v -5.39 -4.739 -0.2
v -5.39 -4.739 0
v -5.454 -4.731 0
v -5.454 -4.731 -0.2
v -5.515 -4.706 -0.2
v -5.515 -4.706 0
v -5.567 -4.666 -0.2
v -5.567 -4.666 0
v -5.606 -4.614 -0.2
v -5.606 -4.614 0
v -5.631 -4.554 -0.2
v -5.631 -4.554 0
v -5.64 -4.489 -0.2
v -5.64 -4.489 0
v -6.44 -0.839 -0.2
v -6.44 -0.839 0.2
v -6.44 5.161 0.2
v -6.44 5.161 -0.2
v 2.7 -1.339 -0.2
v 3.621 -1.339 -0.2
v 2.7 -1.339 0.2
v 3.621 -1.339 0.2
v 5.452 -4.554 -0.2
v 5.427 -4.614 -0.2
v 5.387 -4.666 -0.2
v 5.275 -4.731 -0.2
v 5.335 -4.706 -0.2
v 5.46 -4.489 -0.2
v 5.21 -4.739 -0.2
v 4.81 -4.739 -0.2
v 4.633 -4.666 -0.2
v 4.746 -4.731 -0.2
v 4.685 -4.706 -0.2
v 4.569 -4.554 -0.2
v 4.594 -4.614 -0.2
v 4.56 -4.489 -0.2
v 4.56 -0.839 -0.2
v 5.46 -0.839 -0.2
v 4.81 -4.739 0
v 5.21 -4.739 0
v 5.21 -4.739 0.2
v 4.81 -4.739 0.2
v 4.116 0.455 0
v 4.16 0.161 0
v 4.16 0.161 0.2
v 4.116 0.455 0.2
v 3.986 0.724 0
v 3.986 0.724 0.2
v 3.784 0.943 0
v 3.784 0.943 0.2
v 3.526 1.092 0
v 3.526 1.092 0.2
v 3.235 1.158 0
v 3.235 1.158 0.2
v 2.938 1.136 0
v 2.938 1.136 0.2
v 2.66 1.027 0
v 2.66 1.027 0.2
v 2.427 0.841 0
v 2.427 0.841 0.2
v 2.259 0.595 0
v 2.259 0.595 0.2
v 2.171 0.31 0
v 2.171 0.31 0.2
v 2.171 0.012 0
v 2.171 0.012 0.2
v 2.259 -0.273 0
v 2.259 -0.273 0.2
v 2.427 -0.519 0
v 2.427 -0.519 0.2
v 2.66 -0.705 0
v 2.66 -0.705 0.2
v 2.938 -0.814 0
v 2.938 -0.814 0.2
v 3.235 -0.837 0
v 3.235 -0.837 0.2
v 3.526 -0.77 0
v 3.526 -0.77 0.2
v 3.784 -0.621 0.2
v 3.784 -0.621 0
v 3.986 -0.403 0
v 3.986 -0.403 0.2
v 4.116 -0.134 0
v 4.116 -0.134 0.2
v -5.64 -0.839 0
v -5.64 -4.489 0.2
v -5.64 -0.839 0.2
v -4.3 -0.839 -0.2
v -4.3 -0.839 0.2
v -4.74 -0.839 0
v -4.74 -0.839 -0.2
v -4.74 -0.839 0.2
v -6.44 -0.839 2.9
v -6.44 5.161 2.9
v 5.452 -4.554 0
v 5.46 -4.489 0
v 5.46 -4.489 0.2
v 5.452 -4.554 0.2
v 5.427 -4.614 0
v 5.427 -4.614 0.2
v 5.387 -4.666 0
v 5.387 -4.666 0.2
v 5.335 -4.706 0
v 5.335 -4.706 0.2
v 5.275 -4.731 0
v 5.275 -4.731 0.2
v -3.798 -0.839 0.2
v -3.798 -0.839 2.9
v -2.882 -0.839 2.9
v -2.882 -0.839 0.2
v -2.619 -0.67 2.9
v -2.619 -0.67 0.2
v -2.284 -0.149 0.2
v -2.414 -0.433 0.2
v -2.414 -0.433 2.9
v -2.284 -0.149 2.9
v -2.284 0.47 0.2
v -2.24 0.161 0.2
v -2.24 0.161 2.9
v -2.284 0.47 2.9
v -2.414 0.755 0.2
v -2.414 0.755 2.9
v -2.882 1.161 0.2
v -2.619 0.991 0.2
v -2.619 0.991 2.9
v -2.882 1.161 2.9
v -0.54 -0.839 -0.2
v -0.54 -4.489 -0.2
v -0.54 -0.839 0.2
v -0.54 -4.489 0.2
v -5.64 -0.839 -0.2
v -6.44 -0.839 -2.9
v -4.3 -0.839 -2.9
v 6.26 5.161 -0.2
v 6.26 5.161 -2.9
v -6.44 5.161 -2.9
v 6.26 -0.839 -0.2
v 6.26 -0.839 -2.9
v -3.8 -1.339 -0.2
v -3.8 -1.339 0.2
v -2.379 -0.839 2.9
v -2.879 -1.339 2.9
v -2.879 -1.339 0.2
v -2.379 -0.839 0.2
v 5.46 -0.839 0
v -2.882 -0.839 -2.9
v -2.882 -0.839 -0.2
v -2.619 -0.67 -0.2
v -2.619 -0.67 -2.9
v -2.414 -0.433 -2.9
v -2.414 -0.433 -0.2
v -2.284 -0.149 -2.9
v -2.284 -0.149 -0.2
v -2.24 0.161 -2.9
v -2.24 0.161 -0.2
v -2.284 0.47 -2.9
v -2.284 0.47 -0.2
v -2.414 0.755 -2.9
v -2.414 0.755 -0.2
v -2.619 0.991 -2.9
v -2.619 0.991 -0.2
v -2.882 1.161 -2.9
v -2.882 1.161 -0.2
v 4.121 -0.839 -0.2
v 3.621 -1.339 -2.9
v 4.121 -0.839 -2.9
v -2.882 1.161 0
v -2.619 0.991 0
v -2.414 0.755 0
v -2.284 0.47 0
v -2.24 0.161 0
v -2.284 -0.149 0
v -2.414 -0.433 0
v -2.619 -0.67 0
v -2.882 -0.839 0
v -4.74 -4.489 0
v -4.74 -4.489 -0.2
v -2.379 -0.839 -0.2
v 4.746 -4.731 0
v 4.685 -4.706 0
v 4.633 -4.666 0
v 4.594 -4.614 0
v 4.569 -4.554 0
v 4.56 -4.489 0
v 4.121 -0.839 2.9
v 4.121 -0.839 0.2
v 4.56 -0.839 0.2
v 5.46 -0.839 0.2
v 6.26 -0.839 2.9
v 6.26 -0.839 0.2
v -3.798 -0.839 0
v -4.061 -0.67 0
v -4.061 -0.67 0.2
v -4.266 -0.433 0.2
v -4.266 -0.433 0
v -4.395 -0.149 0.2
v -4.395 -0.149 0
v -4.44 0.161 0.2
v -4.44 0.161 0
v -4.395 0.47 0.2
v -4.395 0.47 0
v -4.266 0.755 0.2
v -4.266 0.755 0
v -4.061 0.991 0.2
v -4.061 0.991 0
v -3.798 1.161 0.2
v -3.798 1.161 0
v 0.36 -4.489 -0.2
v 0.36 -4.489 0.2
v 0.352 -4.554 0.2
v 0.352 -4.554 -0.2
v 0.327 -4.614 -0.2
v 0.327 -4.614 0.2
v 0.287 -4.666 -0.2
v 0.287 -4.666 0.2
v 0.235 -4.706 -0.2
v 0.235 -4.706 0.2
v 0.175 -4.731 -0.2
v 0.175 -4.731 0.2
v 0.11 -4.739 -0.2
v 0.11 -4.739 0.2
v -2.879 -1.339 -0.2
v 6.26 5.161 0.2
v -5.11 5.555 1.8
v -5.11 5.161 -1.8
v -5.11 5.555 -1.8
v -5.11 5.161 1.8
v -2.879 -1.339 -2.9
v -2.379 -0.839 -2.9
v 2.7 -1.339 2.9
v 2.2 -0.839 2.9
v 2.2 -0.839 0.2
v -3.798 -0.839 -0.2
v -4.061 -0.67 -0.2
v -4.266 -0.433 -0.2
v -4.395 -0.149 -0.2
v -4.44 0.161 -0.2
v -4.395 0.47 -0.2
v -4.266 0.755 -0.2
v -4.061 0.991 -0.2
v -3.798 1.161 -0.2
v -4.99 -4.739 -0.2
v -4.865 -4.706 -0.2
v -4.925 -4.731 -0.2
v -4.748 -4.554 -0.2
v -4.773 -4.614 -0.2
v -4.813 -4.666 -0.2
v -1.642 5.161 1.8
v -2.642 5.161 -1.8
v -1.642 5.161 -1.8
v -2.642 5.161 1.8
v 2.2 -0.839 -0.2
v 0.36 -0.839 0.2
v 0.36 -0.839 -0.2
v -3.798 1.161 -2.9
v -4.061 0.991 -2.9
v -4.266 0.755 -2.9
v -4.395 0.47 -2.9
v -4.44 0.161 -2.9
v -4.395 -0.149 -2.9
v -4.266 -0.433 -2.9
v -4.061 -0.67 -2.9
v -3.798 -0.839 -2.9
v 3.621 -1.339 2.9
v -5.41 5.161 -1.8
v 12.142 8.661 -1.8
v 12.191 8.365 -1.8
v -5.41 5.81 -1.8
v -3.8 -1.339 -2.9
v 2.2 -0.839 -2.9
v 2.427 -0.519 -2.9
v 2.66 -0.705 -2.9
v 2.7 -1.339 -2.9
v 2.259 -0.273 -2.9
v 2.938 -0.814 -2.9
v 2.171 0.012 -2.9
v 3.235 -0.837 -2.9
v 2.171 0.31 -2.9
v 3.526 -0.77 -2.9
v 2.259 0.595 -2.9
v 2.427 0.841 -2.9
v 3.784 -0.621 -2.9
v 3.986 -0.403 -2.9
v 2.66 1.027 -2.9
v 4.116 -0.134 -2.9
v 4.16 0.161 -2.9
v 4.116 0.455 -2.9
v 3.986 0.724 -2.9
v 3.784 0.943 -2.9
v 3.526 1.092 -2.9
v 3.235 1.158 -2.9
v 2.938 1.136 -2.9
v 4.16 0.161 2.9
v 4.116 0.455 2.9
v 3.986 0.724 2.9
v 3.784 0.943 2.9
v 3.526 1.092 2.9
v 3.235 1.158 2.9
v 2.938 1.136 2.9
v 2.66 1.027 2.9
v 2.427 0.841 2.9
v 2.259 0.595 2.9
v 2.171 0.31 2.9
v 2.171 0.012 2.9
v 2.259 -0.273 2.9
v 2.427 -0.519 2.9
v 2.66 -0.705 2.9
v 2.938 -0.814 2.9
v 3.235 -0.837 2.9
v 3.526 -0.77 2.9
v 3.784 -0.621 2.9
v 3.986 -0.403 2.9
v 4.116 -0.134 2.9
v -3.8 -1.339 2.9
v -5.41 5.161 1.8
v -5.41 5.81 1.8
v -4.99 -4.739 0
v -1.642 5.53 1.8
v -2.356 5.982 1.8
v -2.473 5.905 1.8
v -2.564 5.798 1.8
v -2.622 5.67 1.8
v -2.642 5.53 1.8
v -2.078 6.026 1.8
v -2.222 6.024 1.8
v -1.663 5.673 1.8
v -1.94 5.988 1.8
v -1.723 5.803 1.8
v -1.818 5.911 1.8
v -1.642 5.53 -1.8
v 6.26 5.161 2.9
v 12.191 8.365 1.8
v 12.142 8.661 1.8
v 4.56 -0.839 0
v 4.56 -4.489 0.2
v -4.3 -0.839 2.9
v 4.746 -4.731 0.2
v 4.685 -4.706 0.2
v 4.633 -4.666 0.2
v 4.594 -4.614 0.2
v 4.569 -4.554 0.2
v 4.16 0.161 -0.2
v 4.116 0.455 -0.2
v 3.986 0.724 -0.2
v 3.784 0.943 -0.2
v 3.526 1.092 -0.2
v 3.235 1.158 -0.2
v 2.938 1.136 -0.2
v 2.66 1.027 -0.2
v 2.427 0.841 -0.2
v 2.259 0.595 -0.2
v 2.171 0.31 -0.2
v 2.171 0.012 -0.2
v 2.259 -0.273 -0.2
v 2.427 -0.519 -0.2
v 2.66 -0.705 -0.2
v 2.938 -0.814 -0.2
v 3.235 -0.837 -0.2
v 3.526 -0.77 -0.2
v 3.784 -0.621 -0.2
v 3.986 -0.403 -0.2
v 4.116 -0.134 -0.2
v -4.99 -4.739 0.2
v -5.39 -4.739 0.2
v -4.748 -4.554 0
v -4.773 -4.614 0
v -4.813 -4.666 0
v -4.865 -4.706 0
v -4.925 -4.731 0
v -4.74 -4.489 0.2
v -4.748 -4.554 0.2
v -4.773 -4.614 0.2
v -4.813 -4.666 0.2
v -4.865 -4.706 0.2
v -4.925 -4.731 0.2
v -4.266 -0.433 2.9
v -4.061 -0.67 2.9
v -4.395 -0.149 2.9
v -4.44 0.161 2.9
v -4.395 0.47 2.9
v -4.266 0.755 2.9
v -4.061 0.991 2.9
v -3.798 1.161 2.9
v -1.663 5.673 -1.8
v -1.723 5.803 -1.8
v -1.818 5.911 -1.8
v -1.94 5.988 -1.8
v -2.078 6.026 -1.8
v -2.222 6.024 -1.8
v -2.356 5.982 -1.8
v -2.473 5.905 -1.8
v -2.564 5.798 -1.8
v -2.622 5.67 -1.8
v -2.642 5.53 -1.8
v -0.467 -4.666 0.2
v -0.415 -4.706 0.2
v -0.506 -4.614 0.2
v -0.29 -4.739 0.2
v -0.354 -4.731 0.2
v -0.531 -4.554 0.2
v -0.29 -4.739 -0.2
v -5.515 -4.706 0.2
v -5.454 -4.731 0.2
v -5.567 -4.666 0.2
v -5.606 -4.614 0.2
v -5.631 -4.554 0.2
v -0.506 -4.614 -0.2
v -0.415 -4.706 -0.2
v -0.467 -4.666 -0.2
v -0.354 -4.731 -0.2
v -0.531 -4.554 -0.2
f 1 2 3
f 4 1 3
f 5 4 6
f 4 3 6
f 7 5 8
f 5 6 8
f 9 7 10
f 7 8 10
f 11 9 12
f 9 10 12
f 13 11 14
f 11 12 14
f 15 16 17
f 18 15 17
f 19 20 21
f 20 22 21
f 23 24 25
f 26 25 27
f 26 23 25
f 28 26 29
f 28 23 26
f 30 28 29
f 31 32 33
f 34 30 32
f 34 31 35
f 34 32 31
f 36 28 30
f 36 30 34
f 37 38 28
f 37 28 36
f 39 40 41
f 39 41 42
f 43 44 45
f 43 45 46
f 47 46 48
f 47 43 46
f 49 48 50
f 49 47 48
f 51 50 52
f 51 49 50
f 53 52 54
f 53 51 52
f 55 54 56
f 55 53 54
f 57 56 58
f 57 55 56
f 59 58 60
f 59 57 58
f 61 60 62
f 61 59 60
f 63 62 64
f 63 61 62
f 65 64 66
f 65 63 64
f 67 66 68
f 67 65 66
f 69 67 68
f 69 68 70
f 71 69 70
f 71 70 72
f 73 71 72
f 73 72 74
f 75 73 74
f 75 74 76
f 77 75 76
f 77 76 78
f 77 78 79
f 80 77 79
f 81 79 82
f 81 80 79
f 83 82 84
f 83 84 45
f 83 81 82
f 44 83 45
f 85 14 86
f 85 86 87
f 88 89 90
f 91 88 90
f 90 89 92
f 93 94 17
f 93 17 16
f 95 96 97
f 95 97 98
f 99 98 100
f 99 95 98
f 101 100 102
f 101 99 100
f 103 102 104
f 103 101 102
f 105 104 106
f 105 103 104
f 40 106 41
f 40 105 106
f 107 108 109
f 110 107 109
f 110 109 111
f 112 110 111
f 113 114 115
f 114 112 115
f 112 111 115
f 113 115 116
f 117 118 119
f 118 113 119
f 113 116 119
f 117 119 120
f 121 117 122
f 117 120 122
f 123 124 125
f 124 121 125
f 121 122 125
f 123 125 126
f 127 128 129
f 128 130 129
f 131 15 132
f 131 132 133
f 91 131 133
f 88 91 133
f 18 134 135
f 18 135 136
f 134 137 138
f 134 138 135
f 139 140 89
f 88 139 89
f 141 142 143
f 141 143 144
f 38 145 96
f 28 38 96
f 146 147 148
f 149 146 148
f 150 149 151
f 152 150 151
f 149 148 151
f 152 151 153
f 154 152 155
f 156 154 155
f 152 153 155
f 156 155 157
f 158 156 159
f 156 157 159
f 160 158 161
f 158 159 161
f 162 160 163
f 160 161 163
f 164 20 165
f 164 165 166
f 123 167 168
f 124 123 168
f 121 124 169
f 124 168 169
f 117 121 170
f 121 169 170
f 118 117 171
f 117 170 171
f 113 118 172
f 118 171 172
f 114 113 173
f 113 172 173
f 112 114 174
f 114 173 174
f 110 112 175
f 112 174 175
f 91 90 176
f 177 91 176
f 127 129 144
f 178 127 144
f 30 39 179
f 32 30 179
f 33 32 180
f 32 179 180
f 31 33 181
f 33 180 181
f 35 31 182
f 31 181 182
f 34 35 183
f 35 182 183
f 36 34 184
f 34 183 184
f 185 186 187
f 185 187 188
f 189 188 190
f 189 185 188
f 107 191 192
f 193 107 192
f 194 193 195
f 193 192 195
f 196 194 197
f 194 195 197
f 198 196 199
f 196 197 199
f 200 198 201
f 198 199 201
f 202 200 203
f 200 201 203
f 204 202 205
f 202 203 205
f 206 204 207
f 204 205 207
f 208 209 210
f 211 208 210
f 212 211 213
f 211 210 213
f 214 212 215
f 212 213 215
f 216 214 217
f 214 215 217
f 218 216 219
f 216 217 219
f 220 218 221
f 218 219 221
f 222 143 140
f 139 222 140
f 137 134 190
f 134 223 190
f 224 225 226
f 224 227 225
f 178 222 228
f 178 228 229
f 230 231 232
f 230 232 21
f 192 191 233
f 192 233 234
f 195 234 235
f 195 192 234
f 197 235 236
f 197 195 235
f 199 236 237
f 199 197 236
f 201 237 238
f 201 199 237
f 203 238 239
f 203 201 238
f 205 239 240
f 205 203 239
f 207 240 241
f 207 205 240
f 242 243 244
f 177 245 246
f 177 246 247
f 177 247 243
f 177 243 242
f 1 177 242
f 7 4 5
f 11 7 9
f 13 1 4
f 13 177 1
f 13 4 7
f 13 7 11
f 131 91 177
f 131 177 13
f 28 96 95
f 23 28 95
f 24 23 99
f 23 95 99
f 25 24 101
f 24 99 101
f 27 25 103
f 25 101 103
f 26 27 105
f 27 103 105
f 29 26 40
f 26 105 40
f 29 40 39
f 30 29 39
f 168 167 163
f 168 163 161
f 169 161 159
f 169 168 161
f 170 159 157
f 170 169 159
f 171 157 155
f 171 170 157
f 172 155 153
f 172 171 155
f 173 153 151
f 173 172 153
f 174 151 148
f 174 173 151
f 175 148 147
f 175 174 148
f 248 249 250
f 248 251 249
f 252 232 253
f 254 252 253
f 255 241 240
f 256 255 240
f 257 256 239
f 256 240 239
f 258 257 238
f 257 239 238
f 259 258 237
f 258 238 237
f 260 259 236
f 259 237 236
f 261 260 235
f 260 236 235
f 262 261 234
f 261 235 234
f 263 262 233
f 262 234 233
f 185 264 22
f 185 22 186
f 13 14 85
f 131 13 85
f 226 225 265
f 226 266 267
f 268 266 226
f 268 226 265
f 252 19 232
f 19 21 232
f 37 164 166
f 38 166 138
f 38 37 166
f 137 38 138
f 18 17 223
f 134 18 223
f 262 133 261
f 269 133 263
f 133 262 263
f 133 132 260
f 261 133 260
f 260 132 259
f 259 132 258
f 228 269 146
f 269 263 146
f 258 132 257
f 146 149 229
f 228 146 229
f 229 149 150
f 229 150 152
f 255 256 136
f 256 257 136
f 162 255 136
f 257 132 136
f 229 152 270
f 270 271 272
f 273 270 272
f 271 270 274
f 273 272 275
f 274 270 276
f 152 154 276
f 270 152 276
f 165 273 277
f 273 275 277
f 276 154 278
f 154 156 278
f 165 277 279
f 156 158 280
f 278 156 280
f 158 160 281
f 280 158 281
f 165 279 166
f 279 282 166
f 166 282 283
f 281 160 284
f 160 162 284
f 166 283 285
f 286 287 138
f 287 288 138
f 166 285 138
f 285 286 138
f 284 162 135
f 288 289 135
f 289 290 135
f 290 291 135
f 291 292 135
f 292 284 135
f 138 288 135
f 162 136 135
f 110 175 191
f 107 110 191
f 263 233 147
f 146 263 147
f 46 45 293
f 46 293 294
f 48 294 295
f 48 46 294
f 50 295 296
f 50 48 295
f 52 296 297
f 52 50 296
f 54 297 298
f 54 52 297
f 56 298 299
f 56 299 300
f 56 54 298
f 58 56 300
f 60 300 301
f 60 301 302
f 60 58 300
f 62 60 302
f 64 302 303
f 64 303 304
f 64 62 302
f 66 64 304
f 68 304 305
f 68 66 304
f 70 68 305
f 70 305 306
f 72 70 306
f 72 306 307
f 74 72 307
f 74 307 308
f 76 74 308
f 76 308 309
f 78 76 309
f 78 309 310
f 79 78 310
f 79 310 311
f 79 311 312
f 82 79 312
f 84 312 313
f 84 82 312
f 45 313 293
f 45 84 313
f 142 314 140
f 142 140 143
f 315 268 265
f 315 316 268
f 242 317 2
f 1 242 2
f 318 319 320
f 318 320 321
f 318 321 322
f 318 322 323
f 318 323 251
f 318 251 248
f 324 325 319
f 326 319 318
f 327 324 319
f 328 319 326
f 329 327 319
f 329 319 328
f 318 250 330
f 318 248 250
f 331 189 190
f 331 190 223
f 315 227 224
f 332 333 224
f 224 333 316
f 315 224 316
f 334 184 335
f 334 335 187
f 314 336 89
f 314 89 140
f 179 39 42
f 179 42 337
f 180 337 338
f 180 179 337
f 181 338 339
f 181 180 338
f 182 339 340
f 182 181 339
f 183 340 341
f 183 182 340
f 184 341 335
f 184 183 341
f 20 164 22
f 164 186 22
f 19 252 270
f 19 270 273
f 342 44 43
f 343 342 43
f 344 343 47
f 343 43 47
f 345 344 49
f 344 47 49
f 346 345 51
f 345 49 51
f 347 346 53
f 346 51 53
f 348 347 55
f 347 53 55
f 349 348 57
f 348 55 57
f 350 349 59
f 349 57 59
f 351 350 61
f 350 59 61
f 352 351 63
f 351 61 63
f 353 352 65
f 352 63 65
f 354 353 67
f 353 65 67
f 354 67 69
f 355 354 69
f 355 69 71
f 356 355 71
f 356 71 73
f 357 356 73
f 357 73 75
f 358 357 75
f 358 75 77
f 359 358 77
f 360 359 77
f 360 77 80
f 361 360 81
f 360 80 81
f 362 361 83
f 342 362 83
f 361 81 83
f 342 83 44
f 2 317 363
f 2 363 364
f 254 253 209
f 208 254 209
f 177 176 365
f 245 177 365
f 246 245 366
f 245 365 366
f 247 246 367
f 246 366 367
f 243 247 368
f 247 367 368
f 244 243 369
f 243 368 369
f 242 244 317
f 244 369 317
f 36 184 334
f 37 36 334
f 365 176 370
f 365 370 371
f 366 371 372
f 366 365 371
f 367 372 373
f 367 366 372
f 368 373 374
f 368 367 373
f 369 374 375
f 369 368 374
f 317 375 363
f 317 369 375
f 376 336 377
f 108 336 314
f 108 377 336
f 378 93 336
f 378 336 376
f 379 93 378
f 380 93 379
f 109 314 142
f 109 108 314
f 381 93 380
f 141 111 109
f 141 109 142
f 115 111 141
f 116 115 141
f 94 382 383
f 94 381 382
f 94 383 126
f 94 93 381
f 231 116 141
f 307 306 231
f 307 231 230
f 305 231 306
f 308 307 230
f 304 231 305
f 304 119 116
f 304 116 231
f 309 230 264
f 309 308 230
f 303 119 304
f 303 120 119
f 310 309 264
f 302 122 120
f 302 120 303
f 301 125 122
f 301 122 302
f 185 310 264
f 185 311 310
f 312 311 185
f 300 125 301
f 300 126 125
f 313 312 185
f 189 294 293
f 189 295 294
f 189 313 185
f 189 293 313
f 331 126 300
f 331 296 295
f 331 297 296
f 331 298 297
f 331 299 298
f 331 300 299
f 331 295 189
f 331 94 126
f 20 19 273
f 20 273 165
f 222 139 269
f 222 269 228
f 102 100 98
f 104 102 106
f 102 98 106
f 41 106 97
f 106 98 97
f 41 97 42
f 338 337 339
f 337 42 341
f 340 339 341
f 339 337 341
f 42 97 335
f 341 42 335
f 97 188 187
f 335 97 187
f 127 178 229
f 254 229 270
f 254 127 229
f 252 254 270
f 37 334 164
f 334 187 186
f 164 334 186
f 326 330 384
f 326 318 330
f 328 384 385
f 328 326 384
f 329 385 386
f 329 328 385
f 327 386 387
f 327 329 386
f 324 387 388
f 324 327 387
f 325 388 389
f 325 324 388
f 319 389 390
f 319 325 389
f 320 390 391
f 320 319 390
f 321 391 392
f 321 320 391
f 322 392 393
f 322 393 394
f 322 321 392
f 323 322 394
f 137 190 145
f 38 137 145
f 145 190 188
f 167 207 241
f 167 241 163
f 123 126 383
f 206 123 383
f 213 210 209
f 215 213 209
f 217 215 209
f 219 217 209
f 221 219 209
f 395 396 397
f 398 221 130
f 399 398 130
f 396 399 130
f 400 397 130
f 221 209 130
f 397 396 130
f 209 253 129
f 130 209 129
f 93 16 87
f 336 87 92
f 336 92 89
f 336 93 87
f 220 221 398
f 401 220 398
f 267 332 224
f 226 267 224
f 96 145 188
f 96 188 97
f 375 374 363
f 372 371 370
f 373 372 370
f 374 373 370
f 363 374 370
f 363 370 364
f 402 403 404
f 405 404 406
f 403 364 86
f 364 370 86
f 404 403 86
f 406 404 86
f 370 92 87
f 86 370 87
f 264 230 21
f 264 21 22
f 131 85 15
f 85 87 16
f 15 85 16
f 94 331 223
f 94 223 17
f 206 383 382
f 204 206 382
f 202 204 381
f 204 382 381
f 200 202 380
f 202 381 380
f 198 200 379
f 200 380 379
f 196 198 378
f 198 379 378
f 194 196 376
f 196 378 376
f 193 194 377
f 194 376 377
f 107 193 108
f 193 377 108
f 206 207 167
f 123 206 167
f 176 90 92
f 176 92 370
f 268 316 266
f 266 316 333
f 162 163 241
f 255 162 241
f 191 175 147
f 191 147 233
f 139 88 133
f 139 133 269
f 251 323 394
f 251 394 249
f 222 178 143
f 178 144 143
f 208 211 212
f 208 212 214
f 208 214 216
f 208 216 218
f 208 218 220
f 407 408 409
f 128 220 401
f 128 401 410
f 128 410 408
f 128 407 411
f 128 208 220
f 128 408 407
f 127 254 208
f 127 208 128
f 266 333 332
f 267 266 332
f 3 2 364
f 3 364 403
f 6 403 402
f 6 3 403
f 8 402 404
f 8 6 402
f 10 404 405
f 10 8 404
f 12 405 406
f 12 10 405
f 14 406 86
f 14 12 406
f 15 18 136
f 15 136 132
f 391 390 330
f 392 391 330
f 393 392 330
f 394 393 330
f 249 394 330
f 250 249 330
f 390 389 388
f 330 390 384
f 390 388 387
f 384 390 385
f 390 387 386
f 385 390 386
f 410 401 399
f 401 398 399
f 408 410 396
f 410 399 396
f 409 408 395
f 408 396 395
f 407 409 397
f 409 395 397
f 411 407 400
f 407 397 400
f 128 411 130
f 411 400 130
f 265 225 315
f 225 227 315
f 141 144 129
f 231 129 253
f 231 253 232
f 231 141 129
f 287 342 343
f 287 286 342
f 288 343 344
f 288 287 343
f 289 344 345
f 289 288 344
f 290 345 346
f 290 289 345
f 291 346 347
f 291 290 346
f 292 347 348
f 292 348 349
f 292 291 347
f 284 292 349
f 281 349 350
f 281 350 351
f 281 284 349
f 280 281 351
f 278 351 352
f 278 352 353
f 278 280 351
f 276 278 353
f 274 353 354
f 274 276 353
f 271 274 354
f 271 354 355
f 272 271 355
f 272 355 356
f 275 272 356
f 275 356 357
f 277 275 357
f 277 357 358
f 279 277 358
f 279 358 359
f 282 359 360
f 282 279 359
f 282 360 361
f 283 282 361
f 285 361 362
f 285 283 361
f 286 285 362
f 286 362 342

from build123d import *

# Parameters (mm, degrees)
SKETCH8_R              = 1
BOSS_EXTRUDE10_DEPTH   = 2.9
BOSS_EXTRUDE11_DEPTH   = 0.2
BOSS_EXTRUDE13_DEPTH   = 1.8
BOSS_EXTRUDE13_2_DEPTH = 1.8


with BuildPart() as part:
    # Sketch8 → Boss-Extrude10 (new, symmetric)
    with BuildSketch(Plane.XY):
        Polygon((6.260240616, 5.160692651), (-6.439759384, 5.160692651), (-6.439759384, -0.839307349), (-5.639759384, -0.839307349), (-4.739759384, -0.839307349), (-4.300072285, -0.839307349), (-3.800072285, -1.339307349), (-2.879446483, -1.339307349), (-2.379446483, -0.839307349), (-0.539759384, -0.839307349), (0.360240616, -0.839307349), (2.199927715, -0.839307349), (2.699927715, -1.339307349), (3.620553517, -1.339307349), (4.120553517, -0.839307349), (4.560240616, -0.839307349), (5.460240616, -0.839307349), (6.260240616, -0.839307349), align=None)
        with BuildLine():
            ThreePointArc((-3.798016954, -0.839307349), (-4.439759384, 0.160692651), (-3.798016954, 1.160692651))
            Line((-3.798016954, 1.160692651), (-2.881501815, 1.160692651))
            ThreePointArc((-2.881501815, 1.160692651), (-2.239759384, 0.160692651), (-2.881501815, -0.839307349))
            Line((-2.881501815, -0.839307349), (-3.798016954, -0.839307349))
        make_face(mode=Mode.SUBTRACT)
        with Locations((3.160240616, 0.160692651)):
            Circle(SKETCH8_R, mode=Mode.SUBTRACT)
    extrude(amount=BOSS_EXTRUDE10_DEPTH, both=True)

    # Sketch8<3> → Boss-Extrude11 (add, symmetric)
    with BuildSketch(Plane.XY):
        with BuildLine():
            Line((-4.739759384, -0.839307349), (-5.639759384, -0.839307349))
            Line((-5.639759384, -0.839307349), (-5.639759384, -4.489307349))
            ThreePointArc((-5.639759384, -4.489307349), (-5.566536079, -4.666084044), (-5.389759384, -4.739307349))
            Line((-5.389759384, -4.739307349), (-4.989759384, -4.739307349))
            ThreePointArc((-4.989759384, -4.739307349), (-4.812982689, -4.666084044), (-4.739759384, -4.489307349))
            Line((-4.739759384, -4.489307349), (-4.739759384, -0.839307349))
        make_face()
        with BuildLine():
            Line((5.460240616, -4.489307349), (5.460240616, -0.839307349))
            Line((5.460240616, -0.839307349), (4.560240616, -0.839307349))
            Line((4.560240616, -0.839307349), (4.560240616, -4.489307349))
            ThreePointArc((4.560240616, -4.489307349), (4.633463921, -4.666084044), (4.810240616, -4.739307349))
            Line((4.810240616, -4.739307349), (5.210240616, -4.739307349))
            ThreePointArc((5.210240616, -4.739307349), (5.387017311, -4.666084044), (5.460240616, -4.489307349))
        make_face()
        with BuildLine():
            Line((0.360240616, -0.839307349), (-0.539759384, -0.839307349))
            Line((-0.539759384, -0.839307349), (-0.539759384, -4.489307349))
            ThreePointArc((-0.539759384, -4.489307349), (-0.466536079, -4.666084044), (-0.289759384, -4.739307349))
            Line((-0.289759384, -4.739307349), (0.110240616, -4.739307349))
            ThreePointArc((0.110240616, -4.739307349), (0.287017311, -4.666084044), (0.360240616, -4.489307349))
            Line((0.360240616, -4.489307349), (0.360240616, -0.839307349))
        make_face()
    extrude(amount=BOSS_EXTRUDE11_DEPTH, both=True)


with BuildPart() as body_2:
    # Sketch9 → Boss-Extrude13 (new, symmetric)
    with BuildSketch(Plane.XY):
        with BuildLine():
            ThreePointArc((-1.641889185, 5.530415203), (-1.817910279, 5.911253317), (-2.22203986, 6.023949264))
            ThreePointArc((-2.22203986, 6.023949264), (-2.522727298, 5.854394108), (-2.641889185, 5.530415203))
            Line((-2.641889185, 5.530415203), (-2.641889185, 5.160692651))
            Line((-2.641889185, 5.160692651), (-1.641889185, 5.160692651))
            Line((-1.641889185, 5.160692651), (-1.641889185, 5.530415203))
        make_face()
    extrude(amount=BOSS_EXTRUDE13_DEPTH, both=True)


with BuildPart() as body_3:
    # Sketch9 → Boss-Extrude13 2 (new, symmetric)
    with BuildSketch(Plane.XY):
        Polygon((-5.409987829, 5.810151849), (-5.409987829, 5.160692651), (-5.109987829, 5.160692651), (-5.109987829, 5.55494193), (-2.22203986, 6.023949264), (12.19052222, 8.364572219), (12.142431792, 8.660692651), align=None)
    extrude(amount=BOSS_EXTRUDE13_2_DEPTH, both=True)


solid = Compound([part.part, body_2.part, body_3.part])
